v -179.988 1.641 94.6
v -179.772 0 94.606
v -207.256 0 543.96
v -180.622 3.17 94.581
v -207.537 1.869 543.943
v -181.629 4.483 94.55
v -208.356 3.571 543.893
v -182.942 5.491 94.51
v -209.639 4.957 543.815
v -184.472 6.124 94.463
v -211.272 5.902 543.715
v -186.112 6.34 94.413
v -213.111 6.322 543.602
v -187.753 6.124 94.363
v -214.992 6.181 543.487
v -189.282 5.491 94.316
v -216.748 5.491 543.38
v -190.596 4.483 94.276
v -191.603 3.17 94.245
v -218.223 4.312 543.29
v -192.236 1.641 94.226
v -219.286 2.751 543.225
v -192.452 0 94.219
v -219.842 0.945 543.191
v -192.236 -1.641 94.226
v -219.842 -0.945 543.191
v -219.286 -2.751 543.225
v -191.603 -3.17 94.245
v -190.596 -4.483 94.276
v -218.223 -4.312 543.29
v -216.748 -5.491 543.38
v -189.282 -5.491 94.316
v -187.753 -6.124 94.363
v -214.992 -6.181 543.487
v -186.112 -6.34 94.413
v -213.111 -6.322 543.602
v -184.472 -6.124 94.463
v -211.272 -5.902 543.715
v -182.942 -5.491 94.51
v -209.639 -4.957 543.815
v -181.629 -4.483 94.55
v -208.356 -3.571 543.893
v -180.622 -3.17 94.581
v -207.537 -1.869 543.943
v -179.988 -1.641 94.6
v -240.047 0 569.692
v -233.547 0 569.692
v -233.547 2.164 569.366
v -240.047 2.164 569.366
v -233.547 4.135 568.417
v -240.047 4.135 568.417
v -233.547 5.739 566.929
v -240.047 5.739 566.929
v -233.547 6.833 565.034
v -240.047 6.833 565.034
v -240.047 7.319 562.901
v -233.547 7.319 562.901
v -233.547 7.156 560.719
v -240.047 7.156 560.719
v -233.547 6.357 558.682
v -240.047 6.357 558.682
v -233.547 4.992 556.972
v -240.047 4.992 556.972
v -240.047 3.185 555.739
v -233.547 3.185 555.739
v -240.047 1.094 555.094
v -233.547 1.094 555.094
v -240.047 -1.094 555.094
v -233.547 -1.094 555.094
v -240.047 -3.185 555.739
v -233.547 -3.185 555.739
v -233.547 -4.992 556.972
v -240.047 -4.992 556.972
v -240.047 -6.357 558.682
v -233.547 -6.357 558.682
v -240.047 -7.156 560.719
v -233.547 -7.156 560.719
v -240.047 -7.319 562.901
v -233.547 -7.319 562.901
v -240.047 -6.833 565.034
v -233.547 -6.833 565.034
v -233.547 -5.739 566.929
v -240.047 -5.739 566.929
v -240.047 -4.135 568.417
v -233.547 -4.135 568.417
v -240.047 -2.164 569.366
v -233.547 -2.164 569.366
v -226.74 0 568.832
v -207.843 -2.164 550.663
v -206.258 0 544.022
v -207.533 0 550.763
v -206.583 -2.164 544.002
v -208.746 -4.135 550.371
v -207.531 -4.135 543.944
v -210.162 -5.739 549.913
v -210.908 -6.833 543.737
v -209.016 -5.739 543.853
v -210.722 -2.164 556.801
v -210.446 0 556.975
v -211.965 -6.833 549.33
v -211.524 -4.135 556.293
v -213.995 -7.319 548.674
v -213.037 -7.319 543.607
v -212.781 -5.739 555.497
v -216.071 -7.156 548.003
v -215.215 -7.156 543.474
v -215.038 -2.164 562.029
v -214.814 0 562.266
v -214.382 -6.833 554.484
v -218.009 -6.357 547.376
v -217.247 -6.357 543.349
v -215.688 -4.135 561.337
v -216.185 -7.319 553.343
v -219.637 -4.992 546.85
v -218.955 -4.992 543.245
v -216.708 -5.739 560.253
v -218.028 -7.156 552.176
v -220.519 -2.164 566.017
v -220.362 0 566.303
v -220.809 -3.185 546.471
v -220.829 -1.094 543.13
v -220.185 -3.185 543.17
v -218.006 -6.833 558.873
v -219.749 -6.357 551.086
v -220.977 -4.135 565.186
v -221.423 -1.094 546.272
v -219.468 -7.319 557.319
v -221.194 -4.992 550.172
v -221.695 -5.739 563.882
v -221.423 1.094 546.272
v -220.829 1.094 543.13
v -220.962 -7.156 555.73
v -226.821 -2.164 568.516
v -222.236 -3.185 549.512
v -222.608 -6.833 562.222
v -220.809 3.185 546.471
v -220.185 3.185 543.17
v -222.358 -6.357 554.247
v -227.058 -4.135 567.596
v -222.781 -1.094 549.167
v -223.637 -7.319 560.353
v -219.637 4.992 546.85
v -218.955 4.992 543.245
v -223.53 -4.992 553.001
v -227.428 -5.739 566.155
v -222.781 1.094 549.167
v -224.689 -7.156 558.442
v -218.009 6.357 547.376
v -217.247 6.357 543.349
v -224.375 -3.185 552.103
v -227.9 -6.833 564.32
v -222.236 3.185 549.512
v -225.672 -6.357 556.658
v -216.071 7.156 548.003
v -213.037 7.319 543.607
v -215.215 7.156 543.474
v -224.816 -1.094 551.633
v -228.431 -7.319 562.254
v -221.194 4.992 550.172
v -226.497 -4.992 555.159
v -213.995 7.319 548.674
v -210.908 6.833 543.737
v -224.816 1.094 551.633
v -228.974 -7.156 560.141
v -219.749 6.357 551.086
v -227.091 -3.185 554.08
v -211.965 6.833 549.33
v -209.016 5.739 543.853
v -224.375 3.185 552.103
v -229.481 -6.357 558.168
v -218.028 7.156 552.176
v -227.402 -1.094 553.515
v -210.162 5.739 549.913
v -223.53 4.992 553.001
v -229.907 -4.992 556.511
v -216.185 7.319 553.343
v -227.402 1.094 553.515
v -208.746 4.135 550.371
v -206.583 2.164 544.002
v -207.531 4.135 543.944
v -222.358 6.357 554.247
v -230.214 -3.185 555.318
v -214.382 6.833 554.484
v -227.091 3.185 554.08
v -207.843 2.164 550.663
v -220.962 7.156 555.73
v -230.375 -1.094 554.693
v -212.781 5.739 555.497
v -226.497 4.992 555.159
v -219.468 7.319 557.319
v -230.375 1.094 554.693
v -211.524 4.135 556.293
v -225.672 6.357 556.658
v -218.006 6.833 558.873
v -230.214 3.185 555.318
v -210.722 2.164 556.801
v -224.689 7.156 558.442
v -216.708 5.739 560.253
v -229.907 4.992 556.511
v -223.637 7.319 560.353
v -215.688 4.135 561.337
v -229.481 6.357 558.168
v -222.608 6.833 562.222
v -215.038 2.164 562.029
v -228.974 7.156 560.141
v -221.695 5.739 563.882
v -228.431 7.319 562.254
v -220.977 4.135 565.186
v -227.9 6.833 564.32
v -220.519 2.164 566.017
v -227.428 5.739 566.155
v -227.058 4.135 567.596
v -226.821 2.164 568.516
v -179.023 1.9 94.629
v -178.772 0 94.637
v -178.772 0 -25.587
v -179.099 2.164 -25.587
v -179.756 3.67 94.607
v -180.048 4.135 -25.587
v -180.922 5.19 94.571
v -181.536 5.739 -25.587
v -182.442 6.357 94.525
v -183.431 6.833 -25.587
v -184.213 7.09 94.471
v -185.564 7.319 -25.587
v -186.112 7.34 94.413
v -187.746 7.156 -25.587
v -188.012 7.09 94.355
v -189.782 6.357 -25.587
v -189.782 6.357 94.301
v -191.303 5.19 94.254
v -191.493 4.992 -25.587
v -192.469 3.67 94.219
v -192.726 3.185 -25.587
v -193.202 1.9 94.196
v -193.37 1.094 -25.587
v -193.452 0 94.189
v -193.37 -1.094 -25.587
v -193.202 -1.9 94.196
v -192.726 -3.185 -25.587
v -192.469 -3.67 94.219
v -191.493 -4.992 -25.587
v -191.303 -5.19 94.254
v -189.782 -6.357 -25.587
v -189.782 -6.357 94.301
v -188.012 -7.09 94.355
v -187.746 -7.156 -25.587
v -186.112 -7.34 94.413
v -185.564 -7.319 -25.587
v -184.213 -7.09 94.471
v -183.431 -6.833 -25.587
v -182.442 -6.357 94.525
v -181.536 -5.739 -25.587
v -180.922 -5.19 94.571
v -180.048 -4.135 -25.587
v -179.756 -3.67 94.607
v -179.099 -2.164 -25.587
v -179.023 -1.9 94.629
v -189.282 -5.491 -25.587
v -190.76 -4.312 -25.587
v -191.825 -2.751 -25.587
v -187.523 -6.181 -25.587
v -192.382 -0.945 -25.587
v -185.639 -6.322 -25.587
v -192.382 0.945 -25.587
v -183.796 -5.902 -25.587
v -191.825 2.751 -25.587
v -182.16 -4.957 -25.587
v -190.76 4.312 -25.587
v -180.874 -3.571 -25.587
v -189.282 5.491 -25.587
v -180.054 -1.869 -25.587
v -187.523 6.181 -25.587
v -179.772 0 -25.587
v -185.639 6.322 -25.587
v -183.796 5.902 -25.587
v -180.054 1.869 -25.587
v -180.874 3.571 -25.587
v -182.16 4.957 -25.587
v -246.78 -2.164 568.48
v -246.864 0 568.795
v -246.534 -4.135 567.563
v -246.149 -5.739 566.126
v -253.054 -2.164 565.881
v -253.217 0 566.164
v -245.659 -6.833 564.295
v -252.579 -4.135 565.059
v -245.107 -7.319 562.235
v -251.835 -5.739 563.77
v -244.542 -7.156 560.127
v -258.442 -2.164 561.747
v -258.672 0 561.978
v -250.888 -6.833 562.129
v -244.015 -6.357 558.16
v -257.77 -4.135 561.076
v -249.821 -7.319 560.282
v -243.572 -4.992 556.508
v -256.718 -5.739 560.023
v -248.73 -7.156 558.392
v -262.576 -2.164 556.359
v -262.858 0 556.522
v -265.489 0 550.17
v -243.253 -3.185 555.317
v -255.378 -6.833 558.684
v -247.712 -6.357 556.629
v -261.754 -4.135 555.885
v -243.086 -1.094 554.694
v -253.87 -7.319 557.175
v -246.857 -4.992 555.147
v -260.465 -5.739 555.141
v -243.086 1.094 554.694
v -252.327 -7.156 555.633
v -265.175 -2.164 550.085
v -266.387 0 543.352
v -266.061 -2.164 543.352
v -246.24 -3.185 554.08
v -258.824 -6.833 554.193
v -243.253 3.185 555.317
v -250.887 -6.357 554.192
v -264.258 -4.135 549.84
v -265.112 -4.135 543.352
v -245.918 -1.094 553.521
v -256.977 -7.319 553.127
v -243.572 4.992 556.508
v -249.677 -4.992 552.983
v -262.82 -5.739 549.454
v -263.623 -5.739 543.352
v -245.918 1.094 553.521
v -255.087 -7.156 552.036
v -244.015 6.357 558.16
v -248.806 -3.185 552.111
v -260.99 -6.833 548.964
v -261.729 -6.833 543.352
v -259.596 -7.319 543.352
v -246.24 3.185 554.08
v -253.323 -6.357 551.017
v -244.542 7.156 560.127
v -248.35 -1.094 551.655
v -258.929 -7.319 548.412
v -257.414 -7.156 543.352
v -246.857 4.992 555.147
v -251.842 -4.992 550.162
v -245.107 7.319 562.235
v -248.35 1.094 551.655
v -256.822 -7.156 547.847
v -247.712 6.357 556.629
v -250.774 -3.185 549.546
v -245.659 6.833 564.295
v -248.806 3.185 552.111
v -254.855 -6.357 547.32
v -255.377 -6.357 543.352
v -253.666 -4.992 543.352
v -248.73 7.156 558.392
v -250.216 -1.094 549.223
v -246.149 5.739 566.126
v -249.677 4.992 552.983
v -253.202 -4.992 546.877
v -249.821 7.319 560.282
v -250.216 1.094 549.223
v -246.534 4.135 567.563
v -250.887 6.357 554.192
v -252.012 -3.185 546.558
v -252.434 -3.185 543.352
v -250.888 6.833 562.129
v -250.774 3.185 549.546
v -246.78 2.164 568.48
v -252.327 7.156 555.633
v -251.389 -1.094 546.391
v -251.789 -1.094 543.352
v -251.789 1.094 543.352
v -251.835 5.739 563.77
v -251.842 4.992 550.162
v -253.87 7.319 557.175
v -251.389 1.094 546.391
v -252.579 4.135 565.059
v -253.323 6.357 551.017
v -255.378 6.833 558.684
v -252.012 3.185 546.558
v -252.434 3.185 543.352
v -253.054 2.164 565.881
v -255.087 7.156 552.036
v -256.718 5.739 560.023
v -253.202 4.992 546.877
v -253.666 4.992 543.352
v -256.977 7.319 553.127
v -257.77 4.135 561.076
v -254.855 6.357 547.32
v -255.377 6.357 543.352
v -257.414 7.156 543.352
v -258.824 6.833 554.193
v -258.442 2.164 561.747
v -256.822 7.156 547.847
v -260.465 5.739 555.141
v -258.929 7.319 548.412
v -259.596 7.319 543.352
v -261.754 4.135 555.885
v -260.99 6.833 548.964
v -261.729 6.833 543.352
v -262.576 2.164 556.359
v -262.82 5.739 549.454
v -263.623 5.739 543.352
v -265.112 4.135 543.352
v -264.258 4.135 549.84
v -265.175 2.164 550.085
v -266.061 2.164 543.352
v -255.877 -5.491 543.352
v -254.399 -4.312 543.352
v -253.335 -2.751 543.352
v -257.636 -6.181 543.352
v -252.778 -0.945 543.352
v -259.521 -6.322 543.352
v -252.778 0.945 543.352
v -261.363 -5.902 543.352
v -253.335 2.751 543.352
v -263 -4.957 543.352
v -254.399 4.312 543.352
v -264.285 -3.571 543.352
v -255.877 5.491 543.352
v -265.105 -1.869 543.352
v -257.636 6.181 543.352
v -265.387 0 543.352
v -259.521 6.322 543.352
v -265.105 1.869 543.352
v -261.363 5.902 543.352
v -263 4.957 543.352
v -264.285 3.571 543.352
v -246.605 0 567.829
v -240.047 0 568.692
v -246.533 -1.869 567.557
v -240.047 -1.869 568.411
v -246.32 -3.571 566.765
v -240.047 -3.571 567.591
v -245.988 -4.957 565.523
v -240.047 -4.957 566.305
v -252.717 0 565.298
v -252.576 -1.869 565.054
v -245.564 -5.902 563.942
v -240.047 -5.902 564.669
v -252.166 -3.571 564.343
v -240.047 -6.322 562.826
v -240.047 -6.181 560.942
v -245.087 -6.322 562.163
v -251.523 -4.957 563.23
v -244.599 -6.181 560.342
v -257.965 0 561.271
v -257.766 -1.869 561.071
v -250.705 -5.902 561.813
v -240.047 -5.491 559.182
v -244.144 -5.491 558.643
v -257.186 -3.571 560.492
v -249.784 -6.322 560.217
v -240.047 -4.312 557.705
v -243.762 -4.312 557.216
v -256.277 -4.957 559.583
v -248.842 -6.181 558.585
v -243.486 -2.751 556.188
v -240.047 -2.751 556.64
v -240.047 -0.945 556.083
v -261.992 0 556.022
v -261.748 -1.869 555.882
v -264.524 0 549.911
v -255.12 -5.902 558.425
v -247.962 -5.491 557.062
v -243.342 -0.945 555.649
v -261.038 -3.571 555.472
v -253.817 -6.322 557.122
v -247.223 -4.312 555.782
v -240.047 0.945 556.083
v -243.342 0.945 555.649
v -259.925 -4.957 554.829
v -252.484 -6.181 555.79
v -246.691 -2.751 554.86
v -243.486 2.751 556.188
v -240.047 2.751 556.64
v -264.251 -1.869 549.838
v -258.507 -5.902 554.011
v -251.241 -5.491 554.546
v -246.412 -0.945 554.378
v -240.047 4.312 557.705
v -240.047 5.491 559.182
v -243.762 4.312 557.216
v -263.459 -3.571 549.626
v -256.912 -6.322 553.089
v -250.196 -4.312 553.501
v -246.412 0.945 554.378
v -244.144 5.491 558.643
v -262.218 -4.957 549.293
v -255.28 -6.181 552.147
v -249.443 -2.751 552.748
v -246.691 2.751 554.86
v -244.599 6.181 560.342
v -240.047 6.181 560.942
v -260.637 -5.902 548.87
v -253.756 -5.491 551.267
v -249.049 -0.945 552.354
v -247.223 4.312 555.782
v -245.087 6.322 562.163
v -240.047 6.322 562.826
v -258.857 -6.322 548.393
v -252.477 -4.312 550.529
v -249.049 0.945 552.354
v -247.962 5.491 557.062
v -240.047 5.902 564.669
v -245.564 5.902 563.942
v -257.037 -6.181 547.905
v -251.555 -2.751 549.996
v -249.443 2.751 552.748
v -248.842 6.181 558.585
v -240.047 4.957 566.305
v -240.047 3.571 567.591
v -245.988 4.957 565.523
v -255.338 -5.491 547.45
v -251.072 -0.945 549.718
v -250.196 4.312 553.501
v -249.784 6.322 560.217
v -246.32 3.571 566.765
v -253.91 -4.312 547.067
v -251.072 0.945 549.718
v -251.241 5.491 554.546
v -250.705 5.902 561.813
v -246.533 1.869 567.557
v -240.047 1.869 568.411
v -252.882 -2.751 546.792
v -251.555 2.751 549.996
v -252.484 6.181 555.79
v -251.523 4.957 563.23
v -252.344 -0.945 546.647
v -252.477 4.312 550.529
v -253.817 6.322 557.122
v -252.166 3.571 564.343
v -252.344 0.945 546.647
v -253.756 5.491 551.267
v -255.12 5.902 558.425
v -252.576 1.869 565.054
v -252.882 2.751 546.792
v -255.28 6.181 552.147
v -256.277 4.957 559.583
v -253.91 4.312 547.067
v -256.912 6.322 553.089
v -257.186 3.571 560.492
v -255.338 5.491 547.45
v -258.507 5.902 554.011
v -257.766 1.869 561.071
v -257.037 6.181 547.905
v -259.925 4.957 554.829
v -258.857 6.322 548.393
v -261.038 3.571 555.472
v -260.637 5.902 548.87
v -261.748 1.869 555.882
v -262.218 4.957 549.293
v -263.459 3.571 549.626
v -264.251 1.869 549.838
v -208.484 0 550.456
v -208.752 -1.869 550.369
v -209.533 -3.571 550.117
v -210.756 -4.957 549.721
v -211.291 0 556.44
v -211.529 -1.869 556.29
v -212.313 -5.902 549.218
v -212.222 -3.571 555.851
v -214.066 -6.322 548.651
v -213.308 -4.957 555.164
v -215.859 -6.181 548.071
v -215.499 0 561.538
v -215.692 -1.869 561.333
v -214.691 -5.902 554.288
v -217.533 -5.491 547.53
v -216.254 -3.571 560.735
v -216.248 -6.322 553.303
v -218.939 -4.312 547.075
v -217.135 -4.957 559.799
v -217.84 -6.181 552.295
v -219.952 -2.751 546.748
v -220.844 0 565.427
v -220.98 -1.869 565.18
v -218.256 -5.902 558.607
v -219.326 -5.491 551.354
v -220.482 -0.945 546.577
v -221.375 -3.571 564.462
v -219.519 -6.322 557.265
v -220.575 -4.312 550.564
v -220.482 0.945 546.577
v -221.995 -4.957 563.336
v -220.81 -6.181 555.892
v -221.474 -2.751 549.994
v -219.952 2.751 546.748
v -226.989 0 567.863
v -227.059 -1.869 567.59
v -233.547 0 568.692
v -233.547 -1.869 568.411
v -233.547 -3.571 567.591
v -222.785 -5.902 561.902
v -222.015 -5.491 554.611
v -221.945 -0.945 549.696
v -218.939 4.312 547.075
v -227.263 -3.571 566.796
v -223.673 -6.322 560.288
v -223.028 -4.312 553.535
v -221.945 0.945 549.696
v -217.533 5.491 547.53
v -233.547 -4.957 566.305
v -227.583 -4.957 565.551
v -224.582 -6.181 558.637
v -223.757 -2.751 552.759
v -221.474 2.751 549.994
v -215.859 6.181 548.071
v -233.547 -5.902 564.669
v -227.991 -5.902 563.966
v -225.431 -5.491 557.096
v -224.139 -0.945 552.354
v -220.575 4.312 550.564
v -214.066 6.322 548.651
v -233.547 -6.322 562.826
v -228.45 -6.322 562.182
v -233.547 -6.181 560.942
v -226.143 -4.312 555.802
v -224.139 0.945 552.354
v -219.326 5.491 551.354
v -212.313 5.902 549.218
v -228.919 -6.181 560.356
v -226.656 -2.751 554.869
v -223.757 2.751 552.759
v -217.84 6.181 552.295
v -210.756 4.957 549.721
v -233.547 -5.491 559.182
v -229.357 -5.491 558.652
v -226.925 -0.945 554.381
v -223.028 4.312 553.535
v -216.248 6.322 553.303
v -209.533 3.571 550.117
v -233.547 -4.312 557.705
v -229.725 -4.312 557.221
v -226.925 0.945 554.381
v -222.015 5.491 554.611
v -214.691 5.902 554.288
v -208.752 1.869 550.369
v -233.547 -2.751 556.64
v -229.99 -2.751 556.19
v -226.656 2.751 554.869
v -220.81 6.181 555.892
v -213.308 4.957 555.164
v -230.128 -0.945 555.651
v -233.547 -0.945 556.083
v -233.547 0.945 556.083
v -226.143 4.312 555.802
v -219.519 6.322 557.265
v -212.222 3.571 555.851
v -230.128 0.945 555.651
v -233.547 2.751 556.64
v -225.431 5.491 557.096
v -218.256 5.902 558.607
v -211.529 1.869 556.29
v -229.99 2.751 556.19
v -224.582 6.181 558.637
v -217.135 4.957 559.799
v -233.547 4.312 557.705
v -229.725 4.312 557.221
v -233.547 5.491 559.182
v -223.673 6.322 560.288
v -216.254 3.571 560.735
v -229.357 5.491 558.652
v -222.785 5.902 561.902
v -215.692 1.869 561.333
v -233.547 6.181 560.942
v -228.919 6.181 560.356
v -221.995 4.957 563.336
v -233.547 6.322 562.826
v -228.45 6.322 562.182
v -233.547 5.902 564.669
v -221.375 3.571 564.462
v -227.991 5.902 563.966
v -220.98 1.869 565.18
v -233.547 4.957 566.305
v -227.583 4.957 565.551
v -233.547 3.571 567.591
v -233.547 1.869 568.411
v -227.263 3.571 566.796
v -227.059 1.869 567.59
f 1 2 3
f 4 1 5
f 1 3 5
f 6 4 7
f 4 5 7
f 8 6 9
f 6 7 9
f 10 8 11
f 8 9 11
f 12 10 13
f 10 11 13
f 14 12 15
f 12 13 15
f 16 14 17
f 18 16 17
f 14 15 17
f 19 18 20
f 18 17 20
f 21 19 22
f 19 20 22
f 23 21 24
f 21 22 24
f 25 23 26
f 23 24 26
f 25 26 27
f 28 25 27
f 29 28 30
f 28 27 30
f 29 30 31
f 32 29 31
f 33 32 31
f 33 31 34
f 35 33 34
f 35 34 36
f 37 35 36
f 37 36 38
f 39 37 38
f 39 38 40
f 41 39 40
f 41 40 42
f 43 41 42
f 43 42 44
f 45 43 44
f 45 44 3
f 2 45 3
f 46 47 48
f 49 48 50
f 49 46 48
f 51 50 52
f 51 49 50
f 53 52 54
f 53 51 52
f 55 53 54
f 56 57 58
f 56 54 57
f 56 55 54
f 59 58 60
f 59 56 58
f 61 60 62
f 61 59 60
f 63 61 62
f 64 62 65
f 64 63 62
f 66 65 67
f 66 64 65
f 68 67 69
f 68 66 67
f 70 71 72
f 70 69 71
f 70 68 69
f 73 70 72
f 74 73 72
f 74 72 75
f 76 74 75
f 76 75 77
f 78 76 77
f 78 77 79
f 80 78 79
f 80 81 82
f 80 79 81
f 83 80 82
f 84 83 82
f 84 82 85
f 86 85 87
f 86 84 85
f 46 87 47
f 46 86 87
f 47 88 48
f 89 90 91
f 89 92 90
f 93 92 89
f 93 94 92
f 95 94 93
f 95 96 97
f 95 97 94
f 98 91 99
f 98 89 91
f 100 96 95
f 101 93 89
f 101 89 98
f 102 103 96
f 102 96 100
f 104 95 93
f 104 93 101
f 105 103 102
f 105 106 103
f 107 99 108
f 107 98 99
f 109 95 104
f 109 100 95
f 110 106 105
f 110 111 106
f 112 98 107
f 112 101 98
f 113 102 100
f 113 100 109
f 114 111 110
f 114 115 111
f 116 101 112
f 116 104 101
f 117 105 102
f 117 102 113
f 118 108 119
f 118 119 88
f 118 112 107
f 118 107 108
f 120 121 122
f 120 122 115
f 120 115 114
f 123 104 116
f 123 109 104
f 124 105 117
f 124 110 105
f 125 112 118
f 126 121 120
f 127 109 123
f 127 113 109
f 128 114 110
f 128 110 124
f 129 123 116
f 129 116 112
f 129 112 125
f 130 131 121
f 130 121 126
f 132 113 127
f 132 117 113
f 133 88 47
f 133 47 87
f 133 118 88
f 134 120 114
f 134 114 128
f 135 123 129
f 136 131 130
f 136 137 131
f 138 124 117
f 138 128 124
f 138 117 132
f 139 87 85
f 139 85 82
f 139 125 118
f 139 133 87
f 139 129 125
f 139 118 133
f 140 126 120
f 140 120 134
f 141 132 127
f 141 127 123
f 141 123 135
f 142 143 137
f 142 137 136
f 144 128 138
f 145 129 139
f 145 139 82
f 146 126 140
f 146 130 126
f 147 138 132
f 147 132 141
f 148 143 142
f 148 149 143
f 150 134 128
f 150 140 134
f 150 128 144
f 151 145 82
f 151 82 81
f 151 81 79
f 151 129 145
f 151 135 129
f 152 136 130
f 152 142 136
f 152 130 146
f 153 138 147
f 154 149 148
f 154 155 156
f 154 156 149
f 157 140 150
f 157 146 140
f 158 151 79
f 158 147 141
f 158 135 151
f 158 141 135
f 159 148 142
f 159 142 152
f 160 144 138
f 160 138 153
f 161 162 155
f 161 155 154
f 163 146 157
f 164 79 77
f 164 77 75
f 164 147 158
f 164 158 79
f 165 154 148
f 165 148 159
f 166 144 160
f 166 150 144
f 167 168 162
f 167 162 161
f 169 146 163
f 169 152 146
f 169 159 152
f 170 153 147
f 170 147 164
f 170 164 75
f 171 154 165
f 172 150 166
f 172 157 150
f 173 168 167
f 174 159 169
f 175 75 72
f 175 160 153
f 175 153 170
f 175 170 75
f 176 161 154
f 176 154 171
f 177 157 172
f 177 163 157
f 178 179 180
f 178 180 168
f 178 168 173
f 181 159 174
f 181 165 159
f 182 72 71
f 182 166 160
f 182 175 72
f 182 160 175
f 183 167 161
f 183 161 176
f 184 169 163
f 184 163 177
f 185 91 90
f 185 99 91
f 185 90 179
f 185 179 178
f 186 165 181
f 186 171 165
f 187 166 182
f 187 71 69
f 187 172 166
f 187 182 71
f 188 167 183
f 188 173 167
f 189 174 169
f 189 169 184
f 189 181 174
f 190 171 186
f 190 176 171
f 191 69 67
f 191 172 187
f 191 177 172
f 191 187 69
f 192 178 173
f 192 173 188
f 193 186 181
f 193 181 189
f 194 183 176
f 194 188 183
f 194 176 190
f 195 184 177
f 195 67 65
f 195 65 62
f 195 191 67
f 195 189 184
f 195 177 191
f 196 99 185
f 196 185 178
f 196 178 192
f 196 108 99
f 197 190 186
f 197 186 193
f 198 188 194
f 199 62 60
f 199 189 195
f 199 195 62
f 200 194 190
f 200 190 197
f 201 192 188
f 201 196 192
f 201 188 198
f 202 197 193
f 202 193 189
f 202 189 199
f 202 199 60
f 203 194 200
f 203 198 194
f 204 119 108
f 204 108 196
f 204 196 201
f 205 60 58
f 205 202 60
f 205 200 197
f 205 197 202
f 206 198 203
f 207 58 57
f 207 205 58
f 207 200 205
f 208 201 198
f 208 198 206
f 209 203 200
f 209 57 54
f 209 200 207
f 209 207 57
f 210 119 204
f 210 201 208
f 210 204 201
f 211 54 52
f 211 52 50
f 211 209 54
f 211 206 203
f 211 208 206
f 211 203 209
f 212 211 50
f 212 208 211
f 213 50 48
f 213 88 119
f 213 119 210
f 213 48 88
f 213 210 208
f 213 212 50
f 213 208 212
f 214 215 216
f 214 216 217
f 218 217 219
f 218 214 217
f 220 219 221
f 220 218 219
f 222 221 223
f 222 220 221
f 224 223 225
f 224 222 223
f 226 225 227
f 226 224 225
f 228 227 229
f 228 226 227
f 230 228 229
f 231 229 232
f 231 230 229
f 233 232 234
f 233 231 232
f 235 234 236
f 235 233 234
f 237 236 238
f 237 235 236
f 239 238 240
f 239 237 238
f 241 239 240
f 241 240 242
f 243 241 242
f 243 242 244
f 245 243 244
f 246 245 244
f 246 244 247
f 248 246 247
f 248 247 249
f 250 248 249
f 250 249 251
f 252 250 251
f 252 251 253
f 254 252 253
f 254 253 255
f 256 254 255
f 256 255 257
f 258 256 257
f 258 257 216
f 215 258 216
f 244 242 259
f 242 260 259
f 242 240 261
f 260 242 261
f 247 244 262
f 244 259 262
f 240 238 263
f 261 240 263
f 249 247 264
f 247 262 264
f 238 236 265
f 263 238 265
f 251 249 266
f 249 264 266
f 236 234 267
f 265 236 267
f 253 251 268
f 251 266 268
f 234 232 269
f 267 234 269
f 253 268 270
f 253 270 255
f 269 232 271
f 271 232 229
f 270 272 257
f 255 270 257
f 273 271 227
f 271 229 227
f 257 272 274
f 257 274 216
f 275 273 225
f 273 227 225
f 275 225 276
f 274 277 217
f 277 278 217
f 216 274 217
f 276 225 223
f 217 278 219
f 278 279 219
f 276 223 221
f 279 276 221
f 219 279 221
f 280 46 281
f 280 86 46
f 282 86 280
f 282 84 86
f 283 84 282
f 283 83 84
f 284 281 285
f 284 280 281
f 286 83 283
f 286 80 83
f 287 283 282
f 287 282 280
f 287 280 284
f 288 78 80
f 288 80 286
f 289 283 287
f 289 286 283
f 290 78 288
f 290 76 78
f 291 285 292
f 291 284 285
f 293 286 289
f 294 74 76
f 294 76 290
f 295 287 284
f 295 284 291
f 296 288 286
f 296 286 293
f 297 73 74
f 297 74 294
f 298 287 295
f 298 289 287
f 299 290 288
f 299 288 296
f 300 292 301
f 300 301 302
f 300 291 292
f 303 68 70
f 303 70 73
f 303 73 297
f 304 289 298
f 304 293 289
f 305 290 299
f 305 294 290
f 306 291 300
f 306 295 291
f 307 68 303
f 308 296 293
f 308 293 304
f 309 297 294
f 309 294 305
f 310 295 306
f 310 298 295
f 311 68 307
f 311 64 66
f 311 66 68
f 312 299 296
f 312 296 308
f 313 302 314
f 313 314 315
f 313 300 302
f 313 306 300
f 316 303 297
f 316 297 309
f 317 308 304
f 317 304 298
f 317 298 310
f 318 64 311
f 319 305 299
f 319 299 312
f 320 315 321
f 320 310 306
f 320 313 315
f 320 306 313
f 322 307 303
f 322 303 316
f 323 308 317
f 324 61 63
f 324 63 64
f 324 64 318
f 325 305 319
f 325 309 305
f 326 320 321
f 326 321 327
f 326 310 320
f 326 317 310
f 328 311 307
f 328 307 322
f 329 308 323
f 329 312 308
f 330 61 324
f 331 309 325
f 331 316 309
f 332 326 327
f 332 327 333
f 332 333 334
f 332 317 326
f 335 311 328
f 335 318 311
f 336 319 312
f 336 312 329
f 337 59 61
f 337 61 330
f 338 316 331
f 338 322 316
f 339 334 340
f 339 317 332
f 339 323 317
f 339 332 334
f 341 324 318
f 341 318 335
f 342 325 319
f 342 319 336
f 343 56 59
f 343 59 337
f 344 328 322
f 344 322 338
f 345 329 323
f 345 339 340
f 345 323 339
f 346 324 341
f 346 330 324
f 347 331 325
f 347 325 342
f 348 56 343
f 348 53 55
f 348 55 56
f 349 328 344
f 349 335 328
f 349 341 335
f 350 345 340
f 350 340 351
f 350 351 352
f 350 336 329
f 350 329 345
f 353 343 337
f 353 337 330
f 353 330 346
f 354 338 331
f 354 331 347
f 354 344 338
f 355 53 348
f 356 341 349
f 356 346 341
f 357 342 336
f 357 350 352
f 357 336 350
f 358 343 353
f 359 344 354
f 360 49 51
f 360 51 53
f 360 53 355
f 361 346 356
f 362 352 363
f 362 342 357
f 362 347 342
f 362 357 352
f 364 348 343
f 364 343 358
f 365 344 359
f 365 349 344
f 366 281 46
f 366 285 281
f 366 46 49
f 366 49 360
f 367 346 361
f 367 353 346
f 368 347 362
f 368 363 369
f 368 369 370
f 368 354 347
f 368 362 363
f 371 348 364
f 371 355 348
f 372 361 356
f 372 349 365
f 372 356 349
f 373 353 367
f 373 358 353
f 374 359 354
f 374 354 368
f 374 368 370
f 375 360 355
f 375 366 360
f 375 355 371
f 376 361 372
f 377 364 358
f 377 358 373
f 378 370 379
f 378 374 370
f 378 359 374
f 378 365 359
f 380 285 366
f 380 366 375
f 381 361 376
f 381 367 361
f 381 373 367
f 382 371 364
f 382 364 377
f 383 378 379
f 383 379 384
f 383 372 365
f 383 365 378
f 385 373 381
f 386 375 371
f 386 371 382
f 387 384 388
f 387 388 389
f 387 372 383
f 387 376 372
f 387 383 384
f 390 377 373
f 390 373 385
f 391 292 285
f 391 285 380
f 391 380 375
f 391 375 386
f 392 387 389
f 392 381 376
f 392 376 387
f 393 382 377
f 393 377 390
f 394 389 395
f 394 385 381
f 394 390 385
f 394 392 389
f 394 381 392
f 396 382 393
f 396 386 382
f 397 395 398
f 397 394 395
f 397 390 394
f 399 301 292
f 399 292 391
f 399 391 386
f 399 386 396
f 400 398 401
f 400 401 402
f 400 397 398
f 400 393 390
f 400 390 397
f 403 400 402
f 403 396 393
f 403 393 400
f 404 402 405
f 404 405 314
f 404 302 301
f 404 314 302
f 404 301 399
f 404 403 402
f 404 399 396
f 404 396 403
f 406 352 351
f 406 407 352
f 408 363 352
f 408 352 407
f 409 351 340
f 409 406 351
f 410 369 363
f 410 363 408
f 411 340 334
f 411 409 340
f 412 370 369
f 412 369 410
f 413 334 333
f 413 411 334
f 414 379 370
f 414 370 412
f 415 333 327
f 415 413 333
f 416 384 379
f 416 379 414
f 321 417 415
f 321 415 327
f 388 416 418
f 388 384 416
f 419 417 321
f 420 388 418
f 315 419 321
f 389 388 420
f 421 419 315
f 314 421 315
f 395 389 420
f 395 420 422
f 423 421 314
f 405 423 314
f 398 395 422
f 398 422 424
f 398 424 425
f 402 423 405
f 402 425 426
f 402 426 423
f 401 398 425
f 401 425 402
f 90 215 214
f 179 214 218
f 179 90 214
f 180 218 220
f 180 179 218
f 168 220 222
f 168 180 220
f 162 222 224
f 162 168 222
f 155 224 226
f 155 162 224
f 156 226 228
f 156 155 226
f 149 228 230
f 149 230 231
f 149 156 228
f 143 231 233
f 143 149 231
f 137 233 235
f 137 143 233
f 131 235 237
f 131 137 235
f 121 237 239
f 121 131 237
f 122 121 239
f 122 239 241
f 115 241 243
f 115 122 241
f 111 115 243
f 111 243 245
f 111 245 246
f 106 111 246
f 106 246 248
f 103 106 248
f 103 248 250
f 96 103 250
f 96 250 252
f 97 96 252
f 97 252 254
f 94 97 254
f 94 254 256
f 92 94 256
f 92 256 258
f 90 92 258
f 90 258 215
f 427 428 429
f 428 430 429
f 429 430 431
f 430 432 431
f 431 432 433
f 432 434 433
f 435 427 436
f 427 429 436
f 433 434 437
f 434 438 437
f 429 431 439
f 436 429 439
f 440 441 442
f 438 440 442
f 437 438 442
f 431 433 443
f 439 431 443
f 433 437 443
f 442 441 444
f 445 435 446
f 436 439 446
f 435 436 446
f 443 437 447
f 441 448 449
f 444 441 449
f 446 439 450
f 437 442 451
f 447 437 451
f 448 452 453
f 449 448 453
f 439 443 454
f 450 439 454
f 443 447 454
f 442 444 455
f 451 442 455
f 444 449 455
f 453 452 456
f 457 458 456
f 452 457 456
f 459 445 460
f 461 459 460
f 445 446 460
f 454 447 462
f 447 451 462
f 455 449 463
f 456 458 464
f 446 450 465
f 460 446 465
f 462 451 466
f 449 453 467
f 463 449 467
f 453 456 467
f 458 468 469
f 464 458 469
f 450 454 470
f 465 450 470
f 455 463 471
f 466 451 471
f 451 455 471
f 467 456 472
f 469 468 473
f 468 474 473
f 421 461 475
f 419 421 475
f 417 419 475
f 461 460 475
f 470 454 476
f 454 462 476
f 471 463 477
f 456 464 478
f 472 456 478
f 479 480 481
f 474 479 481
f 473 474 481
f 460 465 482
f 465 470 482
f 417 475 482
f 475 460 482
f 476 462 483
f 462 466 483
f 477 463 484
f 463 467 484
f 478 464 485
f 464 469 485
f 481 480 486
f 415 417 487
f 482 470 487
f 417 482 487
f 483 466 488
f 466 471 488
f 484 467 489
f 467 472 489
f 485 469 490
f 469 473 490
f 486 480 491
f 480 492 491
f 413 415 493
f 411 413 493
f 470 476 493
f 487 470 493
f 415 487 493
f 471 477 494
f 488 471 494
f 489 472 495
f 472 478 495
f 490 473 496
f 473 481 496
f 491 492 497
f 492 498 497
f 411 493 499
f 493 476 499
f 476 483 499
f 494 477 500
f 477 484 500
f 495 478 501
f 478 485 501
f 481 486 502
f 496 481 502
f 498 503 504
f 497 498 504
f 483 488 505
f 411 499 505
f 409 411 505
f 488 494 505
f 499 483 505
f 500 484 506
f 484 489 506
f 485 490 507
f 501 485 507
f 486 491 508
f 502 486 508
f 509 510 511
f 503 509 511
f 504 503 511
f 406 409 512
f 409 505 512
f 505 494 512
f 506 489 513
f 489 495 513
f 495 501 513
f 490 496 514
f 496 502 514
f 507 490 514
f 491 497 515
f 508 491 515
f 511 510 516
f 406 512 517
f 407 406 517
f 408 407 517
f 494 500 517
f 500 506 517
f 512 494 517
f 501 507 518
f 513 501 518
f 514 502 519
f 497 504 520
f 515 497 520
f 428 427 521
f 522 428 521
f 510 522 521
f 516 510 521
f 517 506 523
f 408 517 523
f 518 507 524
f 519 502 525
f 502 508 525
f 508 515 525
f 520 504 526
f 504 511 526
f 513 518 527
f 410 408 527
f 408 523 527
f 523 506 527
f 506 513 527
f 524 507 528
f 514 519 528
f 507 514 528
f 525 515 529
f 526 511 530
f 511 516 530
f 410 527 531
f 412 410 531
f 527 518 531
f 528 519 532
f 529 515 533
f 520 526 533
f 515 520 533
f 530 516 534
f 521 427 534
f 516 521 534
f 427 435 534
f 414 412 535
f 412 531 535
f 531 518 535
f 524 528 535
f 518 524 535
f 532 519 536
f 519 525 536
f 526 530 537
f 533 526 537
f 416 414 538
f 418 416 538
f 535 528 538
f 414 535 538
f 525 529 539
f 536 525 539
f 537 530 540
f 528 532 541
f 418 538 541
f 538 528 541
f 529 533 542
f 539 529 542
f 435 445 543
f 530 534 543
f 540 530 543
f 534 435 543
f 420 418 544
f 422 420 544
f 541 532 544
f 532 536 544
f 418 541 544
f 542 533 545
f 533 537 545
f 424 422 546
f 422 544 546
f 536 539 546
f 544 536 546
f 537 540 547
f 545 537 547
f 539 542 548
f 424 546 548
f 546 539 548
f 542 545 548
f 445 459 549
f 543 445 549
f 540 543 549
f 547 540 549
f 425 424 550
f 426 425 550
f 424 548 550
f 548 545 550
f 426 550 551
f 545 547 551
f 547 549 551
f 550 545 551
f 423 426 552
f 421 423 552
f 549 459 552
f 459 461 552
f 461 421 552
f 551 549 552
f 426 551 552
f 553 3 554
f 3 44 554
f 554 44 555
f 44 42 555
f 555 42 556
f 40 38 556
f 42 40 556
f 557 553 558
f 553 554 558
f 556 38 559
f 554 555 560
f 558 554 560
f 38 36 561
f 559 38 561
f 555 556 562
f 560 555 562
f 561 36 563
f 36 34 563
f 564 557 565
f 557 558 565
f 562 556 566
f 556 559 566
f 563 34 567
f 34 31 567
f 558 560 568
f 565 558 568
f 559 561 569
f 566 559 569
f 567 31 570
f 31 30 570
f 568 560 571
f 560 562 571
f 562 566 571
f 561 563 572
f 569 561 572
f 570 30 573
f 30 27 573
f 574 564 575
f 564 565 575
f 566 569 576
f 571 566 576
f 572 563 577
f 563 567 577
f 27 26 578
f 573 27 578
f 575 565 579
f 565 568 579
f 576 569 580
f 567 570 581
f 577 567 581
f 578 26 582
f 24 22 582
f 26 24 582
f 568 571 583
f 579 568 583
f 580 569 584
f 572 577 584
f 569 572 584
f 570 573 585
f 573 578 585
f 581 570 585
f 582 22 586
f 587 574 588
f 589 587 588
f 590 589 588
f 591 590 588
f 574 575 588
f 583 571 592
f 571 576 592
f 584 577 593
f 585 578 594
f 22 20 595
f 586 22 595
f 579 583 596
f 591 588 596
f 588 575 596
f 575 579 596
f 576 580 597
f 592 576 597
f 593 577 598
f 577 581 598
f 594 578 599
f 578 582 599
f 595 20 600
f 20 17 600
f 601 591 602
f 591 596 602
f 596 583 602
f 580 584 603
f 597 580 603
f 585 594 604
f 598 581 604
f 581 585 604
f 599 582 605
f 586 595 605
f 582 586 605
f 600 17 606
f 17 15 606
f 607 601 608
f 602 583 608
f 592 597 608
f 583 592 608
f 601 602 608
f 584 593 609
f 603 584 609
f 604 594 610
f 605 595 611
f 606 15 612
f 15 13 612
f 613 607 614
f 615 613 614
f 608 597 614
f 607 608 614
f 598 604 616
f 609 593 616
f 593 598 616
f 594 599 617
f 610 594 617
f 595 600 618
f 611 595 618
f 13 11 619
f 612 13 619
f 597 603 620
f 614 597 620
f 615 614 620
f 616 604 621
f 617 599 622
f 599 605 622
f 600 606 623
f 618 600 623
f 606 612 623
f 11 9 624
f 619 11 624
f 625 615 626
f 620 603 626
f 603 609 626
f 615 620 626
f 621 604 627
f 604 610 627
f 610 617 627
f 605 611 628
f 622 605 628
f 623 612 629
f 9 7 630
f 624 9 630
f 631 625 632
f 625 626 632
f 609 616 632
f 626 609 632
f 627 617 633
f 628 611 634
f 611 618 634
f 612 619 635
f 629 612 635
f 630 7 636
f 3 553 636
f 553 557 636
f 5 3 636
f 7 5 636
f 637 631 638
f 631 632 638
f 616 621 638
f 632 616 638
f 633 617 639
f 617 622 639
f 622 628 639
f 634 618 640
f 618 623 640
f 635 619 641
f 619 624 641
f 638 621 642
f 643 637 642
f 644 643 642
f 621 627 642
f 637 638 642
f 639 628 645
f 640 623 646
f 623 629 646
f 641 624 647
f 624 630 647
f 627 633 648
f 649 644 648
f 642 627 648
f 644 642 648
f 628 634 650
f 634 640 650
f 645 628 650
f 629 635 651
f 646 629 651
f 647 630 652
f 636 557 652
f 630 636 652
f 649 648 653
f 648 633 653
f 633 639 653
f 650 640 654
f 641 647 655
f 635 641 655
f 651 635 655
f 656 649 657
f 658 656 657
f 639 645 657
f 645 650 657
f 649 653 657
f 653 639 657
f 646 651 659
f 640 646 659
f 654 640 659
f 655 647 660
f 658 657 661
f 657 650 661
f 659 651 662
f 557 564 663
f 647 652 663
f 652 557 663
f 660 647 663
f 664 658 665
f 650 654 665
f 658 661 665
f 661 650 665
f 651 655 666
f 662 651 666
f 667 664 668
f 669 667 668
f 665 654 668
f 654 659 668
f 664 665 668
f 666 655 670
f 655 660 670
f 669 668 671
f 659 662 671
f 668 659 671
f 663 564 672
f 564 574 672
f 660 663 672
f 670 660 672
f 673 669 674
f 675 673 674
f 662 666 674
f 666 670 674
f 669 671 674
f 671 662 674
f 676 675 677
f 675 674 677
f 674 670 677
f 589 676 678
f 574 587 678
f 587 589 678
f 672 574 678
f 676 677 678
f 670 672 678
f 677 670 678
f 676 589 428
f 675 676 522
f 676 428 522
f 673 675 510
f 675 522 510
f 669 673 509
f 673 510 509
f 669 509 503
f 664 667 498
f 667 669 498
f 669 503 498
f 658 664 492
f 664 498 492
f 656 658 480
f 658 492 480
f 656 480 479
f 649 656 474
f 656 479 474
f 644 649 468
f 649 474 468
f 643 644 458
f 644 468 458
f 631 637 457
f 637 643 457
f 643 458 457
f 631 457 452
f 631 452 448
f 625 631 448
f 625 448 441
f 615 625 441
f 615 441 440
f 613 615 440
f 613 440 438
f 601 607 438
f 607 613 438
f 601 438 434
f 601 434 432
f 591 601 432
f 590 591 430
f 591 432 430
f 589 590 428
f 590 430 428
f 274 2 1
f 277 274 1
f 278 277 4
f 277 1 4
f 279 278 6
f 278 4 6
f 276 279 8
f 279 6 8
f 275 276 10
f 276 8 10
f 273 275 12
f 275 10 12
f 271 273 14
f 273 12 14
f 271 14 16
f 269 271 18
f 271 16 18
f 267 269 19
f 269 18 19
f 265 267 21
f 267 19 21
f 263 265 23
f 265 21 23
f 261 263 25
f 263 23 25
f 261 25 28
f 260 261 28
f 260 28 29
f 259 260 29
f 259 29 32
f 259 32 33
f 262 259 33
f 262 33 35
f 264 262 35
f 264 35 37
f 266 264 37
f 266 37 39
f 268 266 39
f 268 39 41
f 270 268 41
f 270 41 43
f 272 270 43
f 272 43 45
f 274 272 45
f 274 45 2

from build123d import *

# Parameters (mm, degrees)
SKETCH7_R   = 7.34
SKETCH7_R_2 = 6.34


with BuildPart() as part:
    # Sweep-Thin1: sweep along a path in Sketch1
    with BuildLine(Plane(origin=(0, 0, 0), x_dir=(1, 0, 0), z_dir=(0, 1, 0))) as sweep_thin1_path:
        Line((-186.112466625, 25.587240645), (-186.112466625, -94.412759355))
        Line((-186.112466625, -94.412759355), (-213.584309415, -543.573418645))
        ThreePointArc((-213.584309415, -543.573418645), (-219.843345577, -556.919867252), (-233.547005384, -562.352447854))
        Line((-233.547005384, -562.352447854), (-240.047005384, -562.352447854))
        ThreePointArc((-240.047005384, -562.352447854), (-253.482034226, -556.787476697), (-259.047005384, -543.352447854))
    # Sketch7 → Sweep-Thin1 (sweep)
    with BuildSketch(Plane(origin=(-259.047005384, 0, 543.352447854), x_dir=(-1, 0, 0), z_dir=(0, 0, -1))):
        Circle(SKETCH7_R)
        Circle(SKETCH7_R_2, mode=Mode.SUBTRACT)
    sweep(path=sweep_thin1_path.line, transition=Transition.RIGHT)


solid = part.part
